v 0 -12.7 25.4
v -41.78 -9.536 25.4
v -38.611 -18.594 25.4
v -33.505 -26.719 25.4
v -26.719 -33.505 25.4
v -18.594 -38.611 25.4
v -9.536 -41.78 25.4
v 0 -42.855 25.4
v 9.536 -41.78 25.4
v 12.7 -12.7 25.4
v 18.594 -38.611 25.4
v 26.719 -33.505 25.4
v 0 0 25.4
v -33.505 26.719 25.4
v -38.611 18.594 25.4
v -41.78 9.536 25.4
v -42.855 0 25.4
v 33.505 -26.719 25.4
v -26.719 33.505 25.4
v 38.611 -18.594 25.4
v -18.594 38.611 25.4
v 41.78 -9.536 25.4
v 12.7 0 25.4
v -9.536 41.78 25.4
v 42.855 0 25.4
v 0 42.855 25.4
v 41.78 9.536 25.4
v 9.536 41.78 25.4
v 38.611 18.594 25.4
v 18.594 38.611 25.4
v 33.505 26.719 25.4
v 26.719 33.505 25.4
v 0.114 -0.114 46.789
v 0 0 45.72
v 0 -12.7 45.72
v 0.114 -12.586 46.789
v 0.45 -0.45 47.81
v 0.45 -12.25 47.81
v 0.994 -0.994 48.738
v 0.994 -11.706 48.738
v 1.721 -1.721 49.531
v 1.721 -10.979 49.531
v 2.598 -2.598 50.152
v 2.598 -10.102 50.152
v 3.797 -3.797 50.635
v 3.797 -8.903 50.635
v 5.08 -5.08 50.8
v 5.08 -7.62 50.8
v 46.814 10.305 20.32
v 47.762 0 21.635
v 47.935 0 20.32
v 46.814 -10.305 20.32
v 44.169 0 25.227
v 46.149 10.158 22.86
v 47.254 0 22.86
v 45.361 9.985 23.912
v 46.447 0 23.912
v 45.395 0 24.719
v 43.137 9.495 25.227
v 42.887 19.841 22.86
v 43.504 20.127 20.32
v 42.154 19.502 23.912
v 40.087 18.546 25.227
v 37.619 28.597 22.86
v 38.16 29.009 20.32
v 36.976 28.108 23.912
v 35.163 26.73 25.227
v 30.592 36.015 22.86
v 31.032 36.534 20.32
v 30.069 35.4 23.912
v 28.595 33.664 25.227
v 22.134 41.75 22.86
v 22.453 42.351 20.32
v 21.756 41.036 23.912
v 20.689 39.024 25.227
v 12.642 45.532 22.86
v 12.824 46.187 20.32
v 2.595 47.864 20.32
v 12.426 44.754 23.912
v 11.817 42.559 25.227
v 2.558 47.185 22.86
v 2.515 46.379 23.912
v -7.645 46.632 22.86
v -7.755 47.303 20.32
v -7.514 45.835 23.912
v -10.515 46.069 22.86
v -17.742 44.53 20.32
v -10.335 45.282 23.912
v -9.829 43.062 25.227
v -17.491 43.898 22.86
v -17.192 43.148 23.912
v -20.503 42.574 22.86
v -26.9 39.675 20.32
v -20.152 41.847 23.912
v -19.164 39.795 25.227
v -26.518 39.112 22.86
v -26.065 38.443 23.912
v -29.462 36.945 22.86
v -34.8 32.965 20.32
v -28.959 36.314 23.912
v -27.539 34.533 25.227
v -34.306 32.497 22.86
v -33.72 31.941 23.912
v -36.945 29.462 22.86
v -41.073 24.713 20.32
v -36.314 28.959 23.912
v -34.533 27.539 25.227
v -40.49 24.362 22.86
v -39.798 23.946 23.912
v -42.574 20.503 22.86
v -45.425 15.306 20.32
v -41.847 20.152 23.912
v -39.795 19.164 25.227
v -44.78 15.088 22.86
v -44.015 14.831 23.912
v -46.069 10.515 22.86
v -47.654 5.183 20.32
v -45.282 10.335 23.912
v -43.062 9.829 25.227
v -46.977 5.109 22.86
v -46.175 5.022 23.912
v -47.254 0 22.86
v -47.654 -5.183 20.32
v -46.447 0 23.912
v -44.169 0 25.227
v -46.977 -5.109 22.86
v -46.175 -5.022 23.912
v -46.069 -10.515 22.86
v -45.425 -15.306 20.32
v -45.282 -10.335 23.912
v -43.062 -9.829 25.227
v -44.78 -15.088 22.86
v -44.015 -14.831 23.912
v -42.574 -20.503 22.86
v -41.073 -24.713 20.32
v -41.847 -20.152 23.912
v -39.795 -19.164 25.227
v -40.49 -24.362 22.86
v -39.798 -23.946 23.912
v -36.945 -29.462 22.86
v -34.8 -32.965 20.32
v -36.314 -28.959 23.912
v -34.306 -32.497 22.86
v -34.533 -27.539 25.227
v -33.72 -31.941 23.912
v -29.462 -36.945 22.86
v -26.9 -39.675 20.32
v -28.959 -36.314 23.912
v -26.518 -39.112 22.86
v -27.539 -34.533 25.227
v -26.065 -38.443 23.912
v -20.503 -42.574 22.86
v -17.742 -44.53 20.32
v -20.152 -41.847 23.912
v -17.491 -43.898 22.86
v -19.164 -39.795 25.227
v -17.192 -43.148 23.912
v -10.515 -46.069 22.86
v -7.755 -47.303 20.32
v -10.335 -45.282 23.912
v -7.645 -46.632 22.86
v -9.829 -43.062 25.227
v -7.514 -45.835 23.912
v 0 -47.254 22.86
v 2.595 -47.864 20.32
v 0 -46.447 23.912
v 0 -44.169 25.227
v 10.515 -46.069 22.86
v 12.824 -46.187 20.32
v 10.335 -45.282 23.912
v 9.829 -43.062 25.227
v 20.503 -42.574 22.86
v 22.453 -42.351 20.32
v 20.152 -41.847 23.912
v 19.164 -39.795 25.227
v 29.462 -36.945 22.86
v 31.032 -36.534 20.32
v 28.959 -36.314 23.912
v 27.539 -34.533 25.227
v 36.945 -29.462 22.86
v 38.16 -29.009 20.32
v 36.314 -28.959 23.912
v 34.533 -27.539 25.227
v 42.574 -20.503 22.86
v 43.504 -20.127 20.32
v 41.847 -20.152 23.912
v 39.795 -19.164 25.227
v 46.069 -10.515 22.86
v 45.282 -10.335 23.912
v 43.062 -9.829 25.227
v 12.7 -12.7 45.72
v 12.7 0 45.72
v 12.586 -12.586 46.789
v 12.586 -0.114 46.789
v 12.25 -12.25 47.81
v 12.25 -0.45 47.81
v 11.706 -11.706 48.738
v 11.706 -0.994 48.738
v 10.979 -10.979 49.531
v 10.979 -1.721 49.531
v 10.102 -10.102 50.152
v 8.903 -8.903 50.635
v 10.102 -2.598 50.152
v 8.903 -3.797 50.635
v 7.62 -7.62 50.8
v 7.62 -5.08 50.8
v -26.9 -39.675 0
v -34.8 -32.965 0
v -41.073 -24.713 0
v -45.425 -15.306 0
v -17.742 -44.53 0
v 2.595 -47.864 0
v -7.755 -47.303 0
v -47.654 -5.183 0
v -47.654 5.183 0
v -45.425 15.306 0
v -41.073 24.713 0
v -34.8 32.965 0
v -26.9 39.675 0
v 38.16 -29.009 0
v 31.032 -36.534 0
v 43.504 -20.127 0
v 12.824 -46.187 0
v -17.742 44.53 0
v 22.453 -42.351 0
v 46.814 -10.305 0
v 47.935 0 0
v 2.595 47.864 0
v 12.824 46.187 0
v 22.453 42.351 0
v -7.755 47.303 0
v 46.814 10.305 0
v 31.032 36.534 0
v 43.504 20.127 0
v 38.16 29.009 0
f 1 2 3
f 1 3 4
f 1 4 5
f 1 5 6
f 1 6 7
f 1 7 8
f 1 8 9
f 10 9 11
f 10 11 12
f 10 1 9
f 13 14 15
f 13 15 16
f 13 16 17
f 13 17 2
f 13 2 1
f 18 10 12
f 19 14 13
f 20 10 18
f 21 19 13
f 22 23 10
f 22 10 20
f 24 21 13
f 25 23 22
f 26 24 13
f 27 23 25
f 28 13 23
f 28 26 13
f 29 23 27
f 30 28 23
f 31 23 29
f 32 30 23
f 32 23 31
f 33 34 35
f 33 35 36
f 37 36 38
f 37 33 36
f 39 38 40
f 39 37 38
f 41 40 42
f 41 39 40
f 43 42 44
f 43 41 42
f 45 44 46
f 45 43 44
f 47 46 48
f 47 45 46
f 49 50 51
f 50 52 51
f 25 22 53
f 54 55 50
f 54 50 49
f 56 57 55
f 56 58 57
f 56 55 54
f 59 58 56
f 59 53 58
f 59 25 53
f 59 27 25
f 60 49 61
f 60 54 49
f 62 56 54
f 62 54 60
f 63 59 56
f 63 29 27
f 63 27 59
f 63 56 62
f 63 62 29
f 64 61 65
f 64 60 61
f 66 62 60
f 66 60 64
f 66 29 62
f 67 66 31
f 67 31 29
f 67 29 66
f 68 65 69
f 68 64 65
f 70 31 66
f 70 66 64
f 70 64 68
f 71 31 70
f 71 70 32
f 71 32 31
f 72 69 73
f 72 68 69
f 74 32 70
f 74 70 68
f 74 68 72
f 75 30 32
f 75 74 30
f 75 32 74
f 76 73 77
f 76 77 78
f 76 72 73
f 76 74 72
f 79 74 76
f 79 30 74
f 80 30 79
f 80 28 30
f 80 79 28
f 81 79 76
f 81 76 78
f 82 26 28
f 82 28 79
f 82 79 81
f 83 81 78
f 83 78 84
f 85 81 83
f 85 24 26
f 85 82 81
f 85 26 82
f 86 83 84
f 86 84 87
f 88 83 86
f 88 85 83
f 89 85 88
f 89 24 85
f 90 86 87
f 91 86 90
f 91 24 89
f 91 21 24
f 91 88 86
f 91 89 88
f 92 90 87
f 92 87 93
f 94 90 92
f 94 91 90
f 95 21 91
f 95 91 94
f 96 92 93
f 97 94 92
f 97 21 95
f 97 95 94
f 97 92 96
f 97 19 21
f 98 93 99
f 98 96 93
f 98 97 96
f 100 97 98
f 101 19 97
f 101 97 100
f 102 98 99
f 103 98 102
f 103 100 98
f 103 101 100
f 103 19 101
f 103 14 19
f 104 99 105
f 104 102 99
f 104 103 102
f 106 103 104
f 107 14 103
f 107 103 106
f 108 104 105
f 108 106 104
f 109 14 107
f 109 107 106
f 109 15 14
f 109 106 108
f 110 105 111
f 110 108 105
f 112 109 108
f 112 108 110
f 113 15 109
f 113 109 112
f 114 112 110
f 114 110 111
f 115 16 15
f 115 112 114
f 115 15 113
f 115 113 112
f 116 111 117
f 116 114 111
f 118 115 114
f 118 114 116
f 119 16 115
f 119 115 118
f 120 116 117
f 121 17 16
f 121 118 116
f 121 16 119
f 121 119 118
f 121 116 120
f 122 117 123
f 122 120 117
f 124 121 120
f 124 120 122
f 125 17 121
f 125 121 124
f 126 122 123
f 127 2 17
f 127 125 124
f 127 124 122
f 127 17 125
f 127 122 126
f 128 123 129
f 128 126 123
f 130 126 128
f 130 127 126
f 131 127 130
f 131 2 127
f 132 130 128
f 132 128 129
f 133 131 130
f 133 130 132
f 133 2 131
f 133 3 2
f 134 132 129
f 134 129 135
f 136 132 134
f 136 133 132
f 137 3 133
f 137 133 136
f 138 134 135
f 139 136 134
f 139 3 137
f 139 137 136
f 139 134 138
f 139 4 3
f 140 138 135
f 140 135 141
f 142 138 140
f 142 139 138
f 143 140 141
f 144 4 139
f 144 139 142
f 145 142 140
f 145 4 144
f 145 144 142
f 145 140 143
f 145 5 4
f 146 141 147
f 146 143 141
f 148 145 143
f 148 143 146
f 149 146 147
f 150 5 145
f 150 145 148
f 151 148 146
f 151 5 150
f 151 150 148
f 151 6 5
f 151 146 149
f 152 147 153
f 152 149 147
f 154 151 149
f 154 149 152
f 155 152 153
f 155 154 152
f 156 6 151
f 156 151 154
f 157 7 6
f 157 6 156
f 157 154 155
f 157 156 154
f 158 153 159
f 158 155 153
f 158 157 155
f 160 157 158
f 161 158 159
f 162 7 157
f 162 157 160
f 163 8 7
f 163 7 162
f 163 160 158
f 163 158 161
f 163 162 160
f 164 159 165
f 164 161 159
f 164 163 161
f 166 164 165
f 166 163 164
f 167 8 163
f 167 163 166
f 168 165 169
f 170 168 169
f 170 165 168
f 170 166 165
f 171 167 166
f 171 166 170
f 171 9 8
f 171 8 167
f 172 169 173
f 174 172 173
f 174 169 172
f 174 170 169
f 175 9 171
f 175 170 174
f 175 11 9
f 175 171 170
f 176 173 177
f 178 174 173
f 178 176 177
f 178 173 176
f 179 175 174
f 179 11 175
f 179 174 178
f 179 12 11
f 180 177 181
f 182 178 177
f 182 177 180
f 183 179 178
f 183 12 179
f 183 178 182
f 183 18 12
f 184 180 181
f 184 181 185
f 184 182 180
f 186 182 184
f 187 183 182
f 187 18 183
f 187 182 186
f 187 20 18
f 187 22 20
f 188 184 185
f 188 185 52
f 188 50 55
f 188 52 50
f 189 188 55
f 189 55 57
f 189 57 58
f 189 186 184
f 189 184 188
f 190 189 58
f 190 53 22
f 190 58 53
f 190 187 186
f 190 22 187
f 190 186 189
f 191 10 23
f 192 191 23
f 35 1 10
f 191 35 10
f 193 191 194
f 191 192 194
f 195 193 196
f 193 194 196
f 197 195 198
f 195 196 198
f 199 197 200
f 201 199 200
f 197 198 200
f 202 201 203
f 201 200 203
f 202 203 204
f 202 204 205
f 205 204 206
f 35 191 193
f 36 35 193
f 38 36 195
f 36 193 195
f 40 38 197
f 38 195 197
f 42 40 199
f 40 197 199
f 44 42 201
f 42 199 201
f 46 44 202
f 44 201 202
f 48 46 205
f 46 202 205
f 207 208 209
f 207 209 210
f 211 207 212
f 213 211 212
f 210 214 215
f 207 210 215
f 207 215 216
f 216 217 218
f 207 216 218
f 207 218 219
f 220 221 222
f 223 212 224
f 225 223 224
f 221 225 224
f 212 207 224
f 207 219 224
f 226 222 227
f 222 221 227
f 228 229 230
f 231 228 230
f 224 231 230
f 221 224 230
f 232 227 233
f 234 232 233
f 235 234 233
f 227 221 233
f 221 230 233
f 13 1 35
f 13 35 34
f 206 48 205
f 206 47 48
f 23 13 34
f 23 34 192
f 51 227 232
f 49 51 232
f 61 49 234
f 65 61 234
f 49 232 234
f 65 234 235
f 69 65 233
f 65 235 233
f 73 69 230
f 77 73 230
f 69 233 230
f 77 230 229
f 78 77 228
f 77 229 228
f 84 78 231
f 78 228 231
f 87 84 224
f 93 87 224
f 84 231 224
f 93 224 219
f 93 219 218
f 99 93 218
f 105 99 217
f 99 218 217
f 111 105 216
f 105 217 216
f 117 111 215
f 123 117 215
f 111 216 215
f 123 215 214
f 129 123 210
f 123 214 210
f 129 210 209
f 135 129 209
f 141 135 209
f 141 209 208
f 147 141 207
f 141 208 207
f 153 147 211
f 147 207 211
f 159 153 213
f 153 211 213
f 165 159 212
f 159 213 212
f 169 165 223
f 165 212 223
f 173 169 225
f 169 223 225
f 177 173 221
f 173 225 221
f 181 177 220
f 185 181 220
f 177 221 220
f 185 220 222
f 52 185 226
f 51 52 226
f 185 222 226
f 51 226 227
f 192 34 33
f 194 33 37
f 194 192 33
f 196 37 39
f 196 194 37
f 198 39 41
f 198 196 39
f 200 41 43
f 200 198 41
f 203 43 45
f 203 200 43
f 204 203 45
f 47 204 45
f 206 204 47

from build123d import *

# Parameters (mm, degrees)
F0_R     = 47.934671
F1_DEPTH = 25.4
F2_W     = 12.7
F2_H     = 12.7
F3_DEPTH = 25.4
F4_R     = 5.08


with BuildPart() as f1:
    # F0 (on Top) → F1 (new body)
    with BuildSketch(Plane.XY):
        Circle(F0_R)
    extrude(amount=F1_DEPTH)

    # F2 (on face) → F3 (join)
    with BuildSketch(Plane.XY.offset(25.4)):
        with Locations((6.35, -6.35)):
            Rectangle(F2_W, F2_H)
    extrude(amount=F3_DEPTH)

    # F4
    f4_edges = [f1.edges().sort_by_distance(p)[0] for p in [
        (-47.934671, 0, 25.4),
        (6.35, -12.7, 50.8),
        (12.7, -6.35, 50.8),
        (6.35, 0, 50.8),
        (0, -6.35, 50.8),
    ]]
    fillet(f4_edges, radius=F4_R)


solid = f1.part
